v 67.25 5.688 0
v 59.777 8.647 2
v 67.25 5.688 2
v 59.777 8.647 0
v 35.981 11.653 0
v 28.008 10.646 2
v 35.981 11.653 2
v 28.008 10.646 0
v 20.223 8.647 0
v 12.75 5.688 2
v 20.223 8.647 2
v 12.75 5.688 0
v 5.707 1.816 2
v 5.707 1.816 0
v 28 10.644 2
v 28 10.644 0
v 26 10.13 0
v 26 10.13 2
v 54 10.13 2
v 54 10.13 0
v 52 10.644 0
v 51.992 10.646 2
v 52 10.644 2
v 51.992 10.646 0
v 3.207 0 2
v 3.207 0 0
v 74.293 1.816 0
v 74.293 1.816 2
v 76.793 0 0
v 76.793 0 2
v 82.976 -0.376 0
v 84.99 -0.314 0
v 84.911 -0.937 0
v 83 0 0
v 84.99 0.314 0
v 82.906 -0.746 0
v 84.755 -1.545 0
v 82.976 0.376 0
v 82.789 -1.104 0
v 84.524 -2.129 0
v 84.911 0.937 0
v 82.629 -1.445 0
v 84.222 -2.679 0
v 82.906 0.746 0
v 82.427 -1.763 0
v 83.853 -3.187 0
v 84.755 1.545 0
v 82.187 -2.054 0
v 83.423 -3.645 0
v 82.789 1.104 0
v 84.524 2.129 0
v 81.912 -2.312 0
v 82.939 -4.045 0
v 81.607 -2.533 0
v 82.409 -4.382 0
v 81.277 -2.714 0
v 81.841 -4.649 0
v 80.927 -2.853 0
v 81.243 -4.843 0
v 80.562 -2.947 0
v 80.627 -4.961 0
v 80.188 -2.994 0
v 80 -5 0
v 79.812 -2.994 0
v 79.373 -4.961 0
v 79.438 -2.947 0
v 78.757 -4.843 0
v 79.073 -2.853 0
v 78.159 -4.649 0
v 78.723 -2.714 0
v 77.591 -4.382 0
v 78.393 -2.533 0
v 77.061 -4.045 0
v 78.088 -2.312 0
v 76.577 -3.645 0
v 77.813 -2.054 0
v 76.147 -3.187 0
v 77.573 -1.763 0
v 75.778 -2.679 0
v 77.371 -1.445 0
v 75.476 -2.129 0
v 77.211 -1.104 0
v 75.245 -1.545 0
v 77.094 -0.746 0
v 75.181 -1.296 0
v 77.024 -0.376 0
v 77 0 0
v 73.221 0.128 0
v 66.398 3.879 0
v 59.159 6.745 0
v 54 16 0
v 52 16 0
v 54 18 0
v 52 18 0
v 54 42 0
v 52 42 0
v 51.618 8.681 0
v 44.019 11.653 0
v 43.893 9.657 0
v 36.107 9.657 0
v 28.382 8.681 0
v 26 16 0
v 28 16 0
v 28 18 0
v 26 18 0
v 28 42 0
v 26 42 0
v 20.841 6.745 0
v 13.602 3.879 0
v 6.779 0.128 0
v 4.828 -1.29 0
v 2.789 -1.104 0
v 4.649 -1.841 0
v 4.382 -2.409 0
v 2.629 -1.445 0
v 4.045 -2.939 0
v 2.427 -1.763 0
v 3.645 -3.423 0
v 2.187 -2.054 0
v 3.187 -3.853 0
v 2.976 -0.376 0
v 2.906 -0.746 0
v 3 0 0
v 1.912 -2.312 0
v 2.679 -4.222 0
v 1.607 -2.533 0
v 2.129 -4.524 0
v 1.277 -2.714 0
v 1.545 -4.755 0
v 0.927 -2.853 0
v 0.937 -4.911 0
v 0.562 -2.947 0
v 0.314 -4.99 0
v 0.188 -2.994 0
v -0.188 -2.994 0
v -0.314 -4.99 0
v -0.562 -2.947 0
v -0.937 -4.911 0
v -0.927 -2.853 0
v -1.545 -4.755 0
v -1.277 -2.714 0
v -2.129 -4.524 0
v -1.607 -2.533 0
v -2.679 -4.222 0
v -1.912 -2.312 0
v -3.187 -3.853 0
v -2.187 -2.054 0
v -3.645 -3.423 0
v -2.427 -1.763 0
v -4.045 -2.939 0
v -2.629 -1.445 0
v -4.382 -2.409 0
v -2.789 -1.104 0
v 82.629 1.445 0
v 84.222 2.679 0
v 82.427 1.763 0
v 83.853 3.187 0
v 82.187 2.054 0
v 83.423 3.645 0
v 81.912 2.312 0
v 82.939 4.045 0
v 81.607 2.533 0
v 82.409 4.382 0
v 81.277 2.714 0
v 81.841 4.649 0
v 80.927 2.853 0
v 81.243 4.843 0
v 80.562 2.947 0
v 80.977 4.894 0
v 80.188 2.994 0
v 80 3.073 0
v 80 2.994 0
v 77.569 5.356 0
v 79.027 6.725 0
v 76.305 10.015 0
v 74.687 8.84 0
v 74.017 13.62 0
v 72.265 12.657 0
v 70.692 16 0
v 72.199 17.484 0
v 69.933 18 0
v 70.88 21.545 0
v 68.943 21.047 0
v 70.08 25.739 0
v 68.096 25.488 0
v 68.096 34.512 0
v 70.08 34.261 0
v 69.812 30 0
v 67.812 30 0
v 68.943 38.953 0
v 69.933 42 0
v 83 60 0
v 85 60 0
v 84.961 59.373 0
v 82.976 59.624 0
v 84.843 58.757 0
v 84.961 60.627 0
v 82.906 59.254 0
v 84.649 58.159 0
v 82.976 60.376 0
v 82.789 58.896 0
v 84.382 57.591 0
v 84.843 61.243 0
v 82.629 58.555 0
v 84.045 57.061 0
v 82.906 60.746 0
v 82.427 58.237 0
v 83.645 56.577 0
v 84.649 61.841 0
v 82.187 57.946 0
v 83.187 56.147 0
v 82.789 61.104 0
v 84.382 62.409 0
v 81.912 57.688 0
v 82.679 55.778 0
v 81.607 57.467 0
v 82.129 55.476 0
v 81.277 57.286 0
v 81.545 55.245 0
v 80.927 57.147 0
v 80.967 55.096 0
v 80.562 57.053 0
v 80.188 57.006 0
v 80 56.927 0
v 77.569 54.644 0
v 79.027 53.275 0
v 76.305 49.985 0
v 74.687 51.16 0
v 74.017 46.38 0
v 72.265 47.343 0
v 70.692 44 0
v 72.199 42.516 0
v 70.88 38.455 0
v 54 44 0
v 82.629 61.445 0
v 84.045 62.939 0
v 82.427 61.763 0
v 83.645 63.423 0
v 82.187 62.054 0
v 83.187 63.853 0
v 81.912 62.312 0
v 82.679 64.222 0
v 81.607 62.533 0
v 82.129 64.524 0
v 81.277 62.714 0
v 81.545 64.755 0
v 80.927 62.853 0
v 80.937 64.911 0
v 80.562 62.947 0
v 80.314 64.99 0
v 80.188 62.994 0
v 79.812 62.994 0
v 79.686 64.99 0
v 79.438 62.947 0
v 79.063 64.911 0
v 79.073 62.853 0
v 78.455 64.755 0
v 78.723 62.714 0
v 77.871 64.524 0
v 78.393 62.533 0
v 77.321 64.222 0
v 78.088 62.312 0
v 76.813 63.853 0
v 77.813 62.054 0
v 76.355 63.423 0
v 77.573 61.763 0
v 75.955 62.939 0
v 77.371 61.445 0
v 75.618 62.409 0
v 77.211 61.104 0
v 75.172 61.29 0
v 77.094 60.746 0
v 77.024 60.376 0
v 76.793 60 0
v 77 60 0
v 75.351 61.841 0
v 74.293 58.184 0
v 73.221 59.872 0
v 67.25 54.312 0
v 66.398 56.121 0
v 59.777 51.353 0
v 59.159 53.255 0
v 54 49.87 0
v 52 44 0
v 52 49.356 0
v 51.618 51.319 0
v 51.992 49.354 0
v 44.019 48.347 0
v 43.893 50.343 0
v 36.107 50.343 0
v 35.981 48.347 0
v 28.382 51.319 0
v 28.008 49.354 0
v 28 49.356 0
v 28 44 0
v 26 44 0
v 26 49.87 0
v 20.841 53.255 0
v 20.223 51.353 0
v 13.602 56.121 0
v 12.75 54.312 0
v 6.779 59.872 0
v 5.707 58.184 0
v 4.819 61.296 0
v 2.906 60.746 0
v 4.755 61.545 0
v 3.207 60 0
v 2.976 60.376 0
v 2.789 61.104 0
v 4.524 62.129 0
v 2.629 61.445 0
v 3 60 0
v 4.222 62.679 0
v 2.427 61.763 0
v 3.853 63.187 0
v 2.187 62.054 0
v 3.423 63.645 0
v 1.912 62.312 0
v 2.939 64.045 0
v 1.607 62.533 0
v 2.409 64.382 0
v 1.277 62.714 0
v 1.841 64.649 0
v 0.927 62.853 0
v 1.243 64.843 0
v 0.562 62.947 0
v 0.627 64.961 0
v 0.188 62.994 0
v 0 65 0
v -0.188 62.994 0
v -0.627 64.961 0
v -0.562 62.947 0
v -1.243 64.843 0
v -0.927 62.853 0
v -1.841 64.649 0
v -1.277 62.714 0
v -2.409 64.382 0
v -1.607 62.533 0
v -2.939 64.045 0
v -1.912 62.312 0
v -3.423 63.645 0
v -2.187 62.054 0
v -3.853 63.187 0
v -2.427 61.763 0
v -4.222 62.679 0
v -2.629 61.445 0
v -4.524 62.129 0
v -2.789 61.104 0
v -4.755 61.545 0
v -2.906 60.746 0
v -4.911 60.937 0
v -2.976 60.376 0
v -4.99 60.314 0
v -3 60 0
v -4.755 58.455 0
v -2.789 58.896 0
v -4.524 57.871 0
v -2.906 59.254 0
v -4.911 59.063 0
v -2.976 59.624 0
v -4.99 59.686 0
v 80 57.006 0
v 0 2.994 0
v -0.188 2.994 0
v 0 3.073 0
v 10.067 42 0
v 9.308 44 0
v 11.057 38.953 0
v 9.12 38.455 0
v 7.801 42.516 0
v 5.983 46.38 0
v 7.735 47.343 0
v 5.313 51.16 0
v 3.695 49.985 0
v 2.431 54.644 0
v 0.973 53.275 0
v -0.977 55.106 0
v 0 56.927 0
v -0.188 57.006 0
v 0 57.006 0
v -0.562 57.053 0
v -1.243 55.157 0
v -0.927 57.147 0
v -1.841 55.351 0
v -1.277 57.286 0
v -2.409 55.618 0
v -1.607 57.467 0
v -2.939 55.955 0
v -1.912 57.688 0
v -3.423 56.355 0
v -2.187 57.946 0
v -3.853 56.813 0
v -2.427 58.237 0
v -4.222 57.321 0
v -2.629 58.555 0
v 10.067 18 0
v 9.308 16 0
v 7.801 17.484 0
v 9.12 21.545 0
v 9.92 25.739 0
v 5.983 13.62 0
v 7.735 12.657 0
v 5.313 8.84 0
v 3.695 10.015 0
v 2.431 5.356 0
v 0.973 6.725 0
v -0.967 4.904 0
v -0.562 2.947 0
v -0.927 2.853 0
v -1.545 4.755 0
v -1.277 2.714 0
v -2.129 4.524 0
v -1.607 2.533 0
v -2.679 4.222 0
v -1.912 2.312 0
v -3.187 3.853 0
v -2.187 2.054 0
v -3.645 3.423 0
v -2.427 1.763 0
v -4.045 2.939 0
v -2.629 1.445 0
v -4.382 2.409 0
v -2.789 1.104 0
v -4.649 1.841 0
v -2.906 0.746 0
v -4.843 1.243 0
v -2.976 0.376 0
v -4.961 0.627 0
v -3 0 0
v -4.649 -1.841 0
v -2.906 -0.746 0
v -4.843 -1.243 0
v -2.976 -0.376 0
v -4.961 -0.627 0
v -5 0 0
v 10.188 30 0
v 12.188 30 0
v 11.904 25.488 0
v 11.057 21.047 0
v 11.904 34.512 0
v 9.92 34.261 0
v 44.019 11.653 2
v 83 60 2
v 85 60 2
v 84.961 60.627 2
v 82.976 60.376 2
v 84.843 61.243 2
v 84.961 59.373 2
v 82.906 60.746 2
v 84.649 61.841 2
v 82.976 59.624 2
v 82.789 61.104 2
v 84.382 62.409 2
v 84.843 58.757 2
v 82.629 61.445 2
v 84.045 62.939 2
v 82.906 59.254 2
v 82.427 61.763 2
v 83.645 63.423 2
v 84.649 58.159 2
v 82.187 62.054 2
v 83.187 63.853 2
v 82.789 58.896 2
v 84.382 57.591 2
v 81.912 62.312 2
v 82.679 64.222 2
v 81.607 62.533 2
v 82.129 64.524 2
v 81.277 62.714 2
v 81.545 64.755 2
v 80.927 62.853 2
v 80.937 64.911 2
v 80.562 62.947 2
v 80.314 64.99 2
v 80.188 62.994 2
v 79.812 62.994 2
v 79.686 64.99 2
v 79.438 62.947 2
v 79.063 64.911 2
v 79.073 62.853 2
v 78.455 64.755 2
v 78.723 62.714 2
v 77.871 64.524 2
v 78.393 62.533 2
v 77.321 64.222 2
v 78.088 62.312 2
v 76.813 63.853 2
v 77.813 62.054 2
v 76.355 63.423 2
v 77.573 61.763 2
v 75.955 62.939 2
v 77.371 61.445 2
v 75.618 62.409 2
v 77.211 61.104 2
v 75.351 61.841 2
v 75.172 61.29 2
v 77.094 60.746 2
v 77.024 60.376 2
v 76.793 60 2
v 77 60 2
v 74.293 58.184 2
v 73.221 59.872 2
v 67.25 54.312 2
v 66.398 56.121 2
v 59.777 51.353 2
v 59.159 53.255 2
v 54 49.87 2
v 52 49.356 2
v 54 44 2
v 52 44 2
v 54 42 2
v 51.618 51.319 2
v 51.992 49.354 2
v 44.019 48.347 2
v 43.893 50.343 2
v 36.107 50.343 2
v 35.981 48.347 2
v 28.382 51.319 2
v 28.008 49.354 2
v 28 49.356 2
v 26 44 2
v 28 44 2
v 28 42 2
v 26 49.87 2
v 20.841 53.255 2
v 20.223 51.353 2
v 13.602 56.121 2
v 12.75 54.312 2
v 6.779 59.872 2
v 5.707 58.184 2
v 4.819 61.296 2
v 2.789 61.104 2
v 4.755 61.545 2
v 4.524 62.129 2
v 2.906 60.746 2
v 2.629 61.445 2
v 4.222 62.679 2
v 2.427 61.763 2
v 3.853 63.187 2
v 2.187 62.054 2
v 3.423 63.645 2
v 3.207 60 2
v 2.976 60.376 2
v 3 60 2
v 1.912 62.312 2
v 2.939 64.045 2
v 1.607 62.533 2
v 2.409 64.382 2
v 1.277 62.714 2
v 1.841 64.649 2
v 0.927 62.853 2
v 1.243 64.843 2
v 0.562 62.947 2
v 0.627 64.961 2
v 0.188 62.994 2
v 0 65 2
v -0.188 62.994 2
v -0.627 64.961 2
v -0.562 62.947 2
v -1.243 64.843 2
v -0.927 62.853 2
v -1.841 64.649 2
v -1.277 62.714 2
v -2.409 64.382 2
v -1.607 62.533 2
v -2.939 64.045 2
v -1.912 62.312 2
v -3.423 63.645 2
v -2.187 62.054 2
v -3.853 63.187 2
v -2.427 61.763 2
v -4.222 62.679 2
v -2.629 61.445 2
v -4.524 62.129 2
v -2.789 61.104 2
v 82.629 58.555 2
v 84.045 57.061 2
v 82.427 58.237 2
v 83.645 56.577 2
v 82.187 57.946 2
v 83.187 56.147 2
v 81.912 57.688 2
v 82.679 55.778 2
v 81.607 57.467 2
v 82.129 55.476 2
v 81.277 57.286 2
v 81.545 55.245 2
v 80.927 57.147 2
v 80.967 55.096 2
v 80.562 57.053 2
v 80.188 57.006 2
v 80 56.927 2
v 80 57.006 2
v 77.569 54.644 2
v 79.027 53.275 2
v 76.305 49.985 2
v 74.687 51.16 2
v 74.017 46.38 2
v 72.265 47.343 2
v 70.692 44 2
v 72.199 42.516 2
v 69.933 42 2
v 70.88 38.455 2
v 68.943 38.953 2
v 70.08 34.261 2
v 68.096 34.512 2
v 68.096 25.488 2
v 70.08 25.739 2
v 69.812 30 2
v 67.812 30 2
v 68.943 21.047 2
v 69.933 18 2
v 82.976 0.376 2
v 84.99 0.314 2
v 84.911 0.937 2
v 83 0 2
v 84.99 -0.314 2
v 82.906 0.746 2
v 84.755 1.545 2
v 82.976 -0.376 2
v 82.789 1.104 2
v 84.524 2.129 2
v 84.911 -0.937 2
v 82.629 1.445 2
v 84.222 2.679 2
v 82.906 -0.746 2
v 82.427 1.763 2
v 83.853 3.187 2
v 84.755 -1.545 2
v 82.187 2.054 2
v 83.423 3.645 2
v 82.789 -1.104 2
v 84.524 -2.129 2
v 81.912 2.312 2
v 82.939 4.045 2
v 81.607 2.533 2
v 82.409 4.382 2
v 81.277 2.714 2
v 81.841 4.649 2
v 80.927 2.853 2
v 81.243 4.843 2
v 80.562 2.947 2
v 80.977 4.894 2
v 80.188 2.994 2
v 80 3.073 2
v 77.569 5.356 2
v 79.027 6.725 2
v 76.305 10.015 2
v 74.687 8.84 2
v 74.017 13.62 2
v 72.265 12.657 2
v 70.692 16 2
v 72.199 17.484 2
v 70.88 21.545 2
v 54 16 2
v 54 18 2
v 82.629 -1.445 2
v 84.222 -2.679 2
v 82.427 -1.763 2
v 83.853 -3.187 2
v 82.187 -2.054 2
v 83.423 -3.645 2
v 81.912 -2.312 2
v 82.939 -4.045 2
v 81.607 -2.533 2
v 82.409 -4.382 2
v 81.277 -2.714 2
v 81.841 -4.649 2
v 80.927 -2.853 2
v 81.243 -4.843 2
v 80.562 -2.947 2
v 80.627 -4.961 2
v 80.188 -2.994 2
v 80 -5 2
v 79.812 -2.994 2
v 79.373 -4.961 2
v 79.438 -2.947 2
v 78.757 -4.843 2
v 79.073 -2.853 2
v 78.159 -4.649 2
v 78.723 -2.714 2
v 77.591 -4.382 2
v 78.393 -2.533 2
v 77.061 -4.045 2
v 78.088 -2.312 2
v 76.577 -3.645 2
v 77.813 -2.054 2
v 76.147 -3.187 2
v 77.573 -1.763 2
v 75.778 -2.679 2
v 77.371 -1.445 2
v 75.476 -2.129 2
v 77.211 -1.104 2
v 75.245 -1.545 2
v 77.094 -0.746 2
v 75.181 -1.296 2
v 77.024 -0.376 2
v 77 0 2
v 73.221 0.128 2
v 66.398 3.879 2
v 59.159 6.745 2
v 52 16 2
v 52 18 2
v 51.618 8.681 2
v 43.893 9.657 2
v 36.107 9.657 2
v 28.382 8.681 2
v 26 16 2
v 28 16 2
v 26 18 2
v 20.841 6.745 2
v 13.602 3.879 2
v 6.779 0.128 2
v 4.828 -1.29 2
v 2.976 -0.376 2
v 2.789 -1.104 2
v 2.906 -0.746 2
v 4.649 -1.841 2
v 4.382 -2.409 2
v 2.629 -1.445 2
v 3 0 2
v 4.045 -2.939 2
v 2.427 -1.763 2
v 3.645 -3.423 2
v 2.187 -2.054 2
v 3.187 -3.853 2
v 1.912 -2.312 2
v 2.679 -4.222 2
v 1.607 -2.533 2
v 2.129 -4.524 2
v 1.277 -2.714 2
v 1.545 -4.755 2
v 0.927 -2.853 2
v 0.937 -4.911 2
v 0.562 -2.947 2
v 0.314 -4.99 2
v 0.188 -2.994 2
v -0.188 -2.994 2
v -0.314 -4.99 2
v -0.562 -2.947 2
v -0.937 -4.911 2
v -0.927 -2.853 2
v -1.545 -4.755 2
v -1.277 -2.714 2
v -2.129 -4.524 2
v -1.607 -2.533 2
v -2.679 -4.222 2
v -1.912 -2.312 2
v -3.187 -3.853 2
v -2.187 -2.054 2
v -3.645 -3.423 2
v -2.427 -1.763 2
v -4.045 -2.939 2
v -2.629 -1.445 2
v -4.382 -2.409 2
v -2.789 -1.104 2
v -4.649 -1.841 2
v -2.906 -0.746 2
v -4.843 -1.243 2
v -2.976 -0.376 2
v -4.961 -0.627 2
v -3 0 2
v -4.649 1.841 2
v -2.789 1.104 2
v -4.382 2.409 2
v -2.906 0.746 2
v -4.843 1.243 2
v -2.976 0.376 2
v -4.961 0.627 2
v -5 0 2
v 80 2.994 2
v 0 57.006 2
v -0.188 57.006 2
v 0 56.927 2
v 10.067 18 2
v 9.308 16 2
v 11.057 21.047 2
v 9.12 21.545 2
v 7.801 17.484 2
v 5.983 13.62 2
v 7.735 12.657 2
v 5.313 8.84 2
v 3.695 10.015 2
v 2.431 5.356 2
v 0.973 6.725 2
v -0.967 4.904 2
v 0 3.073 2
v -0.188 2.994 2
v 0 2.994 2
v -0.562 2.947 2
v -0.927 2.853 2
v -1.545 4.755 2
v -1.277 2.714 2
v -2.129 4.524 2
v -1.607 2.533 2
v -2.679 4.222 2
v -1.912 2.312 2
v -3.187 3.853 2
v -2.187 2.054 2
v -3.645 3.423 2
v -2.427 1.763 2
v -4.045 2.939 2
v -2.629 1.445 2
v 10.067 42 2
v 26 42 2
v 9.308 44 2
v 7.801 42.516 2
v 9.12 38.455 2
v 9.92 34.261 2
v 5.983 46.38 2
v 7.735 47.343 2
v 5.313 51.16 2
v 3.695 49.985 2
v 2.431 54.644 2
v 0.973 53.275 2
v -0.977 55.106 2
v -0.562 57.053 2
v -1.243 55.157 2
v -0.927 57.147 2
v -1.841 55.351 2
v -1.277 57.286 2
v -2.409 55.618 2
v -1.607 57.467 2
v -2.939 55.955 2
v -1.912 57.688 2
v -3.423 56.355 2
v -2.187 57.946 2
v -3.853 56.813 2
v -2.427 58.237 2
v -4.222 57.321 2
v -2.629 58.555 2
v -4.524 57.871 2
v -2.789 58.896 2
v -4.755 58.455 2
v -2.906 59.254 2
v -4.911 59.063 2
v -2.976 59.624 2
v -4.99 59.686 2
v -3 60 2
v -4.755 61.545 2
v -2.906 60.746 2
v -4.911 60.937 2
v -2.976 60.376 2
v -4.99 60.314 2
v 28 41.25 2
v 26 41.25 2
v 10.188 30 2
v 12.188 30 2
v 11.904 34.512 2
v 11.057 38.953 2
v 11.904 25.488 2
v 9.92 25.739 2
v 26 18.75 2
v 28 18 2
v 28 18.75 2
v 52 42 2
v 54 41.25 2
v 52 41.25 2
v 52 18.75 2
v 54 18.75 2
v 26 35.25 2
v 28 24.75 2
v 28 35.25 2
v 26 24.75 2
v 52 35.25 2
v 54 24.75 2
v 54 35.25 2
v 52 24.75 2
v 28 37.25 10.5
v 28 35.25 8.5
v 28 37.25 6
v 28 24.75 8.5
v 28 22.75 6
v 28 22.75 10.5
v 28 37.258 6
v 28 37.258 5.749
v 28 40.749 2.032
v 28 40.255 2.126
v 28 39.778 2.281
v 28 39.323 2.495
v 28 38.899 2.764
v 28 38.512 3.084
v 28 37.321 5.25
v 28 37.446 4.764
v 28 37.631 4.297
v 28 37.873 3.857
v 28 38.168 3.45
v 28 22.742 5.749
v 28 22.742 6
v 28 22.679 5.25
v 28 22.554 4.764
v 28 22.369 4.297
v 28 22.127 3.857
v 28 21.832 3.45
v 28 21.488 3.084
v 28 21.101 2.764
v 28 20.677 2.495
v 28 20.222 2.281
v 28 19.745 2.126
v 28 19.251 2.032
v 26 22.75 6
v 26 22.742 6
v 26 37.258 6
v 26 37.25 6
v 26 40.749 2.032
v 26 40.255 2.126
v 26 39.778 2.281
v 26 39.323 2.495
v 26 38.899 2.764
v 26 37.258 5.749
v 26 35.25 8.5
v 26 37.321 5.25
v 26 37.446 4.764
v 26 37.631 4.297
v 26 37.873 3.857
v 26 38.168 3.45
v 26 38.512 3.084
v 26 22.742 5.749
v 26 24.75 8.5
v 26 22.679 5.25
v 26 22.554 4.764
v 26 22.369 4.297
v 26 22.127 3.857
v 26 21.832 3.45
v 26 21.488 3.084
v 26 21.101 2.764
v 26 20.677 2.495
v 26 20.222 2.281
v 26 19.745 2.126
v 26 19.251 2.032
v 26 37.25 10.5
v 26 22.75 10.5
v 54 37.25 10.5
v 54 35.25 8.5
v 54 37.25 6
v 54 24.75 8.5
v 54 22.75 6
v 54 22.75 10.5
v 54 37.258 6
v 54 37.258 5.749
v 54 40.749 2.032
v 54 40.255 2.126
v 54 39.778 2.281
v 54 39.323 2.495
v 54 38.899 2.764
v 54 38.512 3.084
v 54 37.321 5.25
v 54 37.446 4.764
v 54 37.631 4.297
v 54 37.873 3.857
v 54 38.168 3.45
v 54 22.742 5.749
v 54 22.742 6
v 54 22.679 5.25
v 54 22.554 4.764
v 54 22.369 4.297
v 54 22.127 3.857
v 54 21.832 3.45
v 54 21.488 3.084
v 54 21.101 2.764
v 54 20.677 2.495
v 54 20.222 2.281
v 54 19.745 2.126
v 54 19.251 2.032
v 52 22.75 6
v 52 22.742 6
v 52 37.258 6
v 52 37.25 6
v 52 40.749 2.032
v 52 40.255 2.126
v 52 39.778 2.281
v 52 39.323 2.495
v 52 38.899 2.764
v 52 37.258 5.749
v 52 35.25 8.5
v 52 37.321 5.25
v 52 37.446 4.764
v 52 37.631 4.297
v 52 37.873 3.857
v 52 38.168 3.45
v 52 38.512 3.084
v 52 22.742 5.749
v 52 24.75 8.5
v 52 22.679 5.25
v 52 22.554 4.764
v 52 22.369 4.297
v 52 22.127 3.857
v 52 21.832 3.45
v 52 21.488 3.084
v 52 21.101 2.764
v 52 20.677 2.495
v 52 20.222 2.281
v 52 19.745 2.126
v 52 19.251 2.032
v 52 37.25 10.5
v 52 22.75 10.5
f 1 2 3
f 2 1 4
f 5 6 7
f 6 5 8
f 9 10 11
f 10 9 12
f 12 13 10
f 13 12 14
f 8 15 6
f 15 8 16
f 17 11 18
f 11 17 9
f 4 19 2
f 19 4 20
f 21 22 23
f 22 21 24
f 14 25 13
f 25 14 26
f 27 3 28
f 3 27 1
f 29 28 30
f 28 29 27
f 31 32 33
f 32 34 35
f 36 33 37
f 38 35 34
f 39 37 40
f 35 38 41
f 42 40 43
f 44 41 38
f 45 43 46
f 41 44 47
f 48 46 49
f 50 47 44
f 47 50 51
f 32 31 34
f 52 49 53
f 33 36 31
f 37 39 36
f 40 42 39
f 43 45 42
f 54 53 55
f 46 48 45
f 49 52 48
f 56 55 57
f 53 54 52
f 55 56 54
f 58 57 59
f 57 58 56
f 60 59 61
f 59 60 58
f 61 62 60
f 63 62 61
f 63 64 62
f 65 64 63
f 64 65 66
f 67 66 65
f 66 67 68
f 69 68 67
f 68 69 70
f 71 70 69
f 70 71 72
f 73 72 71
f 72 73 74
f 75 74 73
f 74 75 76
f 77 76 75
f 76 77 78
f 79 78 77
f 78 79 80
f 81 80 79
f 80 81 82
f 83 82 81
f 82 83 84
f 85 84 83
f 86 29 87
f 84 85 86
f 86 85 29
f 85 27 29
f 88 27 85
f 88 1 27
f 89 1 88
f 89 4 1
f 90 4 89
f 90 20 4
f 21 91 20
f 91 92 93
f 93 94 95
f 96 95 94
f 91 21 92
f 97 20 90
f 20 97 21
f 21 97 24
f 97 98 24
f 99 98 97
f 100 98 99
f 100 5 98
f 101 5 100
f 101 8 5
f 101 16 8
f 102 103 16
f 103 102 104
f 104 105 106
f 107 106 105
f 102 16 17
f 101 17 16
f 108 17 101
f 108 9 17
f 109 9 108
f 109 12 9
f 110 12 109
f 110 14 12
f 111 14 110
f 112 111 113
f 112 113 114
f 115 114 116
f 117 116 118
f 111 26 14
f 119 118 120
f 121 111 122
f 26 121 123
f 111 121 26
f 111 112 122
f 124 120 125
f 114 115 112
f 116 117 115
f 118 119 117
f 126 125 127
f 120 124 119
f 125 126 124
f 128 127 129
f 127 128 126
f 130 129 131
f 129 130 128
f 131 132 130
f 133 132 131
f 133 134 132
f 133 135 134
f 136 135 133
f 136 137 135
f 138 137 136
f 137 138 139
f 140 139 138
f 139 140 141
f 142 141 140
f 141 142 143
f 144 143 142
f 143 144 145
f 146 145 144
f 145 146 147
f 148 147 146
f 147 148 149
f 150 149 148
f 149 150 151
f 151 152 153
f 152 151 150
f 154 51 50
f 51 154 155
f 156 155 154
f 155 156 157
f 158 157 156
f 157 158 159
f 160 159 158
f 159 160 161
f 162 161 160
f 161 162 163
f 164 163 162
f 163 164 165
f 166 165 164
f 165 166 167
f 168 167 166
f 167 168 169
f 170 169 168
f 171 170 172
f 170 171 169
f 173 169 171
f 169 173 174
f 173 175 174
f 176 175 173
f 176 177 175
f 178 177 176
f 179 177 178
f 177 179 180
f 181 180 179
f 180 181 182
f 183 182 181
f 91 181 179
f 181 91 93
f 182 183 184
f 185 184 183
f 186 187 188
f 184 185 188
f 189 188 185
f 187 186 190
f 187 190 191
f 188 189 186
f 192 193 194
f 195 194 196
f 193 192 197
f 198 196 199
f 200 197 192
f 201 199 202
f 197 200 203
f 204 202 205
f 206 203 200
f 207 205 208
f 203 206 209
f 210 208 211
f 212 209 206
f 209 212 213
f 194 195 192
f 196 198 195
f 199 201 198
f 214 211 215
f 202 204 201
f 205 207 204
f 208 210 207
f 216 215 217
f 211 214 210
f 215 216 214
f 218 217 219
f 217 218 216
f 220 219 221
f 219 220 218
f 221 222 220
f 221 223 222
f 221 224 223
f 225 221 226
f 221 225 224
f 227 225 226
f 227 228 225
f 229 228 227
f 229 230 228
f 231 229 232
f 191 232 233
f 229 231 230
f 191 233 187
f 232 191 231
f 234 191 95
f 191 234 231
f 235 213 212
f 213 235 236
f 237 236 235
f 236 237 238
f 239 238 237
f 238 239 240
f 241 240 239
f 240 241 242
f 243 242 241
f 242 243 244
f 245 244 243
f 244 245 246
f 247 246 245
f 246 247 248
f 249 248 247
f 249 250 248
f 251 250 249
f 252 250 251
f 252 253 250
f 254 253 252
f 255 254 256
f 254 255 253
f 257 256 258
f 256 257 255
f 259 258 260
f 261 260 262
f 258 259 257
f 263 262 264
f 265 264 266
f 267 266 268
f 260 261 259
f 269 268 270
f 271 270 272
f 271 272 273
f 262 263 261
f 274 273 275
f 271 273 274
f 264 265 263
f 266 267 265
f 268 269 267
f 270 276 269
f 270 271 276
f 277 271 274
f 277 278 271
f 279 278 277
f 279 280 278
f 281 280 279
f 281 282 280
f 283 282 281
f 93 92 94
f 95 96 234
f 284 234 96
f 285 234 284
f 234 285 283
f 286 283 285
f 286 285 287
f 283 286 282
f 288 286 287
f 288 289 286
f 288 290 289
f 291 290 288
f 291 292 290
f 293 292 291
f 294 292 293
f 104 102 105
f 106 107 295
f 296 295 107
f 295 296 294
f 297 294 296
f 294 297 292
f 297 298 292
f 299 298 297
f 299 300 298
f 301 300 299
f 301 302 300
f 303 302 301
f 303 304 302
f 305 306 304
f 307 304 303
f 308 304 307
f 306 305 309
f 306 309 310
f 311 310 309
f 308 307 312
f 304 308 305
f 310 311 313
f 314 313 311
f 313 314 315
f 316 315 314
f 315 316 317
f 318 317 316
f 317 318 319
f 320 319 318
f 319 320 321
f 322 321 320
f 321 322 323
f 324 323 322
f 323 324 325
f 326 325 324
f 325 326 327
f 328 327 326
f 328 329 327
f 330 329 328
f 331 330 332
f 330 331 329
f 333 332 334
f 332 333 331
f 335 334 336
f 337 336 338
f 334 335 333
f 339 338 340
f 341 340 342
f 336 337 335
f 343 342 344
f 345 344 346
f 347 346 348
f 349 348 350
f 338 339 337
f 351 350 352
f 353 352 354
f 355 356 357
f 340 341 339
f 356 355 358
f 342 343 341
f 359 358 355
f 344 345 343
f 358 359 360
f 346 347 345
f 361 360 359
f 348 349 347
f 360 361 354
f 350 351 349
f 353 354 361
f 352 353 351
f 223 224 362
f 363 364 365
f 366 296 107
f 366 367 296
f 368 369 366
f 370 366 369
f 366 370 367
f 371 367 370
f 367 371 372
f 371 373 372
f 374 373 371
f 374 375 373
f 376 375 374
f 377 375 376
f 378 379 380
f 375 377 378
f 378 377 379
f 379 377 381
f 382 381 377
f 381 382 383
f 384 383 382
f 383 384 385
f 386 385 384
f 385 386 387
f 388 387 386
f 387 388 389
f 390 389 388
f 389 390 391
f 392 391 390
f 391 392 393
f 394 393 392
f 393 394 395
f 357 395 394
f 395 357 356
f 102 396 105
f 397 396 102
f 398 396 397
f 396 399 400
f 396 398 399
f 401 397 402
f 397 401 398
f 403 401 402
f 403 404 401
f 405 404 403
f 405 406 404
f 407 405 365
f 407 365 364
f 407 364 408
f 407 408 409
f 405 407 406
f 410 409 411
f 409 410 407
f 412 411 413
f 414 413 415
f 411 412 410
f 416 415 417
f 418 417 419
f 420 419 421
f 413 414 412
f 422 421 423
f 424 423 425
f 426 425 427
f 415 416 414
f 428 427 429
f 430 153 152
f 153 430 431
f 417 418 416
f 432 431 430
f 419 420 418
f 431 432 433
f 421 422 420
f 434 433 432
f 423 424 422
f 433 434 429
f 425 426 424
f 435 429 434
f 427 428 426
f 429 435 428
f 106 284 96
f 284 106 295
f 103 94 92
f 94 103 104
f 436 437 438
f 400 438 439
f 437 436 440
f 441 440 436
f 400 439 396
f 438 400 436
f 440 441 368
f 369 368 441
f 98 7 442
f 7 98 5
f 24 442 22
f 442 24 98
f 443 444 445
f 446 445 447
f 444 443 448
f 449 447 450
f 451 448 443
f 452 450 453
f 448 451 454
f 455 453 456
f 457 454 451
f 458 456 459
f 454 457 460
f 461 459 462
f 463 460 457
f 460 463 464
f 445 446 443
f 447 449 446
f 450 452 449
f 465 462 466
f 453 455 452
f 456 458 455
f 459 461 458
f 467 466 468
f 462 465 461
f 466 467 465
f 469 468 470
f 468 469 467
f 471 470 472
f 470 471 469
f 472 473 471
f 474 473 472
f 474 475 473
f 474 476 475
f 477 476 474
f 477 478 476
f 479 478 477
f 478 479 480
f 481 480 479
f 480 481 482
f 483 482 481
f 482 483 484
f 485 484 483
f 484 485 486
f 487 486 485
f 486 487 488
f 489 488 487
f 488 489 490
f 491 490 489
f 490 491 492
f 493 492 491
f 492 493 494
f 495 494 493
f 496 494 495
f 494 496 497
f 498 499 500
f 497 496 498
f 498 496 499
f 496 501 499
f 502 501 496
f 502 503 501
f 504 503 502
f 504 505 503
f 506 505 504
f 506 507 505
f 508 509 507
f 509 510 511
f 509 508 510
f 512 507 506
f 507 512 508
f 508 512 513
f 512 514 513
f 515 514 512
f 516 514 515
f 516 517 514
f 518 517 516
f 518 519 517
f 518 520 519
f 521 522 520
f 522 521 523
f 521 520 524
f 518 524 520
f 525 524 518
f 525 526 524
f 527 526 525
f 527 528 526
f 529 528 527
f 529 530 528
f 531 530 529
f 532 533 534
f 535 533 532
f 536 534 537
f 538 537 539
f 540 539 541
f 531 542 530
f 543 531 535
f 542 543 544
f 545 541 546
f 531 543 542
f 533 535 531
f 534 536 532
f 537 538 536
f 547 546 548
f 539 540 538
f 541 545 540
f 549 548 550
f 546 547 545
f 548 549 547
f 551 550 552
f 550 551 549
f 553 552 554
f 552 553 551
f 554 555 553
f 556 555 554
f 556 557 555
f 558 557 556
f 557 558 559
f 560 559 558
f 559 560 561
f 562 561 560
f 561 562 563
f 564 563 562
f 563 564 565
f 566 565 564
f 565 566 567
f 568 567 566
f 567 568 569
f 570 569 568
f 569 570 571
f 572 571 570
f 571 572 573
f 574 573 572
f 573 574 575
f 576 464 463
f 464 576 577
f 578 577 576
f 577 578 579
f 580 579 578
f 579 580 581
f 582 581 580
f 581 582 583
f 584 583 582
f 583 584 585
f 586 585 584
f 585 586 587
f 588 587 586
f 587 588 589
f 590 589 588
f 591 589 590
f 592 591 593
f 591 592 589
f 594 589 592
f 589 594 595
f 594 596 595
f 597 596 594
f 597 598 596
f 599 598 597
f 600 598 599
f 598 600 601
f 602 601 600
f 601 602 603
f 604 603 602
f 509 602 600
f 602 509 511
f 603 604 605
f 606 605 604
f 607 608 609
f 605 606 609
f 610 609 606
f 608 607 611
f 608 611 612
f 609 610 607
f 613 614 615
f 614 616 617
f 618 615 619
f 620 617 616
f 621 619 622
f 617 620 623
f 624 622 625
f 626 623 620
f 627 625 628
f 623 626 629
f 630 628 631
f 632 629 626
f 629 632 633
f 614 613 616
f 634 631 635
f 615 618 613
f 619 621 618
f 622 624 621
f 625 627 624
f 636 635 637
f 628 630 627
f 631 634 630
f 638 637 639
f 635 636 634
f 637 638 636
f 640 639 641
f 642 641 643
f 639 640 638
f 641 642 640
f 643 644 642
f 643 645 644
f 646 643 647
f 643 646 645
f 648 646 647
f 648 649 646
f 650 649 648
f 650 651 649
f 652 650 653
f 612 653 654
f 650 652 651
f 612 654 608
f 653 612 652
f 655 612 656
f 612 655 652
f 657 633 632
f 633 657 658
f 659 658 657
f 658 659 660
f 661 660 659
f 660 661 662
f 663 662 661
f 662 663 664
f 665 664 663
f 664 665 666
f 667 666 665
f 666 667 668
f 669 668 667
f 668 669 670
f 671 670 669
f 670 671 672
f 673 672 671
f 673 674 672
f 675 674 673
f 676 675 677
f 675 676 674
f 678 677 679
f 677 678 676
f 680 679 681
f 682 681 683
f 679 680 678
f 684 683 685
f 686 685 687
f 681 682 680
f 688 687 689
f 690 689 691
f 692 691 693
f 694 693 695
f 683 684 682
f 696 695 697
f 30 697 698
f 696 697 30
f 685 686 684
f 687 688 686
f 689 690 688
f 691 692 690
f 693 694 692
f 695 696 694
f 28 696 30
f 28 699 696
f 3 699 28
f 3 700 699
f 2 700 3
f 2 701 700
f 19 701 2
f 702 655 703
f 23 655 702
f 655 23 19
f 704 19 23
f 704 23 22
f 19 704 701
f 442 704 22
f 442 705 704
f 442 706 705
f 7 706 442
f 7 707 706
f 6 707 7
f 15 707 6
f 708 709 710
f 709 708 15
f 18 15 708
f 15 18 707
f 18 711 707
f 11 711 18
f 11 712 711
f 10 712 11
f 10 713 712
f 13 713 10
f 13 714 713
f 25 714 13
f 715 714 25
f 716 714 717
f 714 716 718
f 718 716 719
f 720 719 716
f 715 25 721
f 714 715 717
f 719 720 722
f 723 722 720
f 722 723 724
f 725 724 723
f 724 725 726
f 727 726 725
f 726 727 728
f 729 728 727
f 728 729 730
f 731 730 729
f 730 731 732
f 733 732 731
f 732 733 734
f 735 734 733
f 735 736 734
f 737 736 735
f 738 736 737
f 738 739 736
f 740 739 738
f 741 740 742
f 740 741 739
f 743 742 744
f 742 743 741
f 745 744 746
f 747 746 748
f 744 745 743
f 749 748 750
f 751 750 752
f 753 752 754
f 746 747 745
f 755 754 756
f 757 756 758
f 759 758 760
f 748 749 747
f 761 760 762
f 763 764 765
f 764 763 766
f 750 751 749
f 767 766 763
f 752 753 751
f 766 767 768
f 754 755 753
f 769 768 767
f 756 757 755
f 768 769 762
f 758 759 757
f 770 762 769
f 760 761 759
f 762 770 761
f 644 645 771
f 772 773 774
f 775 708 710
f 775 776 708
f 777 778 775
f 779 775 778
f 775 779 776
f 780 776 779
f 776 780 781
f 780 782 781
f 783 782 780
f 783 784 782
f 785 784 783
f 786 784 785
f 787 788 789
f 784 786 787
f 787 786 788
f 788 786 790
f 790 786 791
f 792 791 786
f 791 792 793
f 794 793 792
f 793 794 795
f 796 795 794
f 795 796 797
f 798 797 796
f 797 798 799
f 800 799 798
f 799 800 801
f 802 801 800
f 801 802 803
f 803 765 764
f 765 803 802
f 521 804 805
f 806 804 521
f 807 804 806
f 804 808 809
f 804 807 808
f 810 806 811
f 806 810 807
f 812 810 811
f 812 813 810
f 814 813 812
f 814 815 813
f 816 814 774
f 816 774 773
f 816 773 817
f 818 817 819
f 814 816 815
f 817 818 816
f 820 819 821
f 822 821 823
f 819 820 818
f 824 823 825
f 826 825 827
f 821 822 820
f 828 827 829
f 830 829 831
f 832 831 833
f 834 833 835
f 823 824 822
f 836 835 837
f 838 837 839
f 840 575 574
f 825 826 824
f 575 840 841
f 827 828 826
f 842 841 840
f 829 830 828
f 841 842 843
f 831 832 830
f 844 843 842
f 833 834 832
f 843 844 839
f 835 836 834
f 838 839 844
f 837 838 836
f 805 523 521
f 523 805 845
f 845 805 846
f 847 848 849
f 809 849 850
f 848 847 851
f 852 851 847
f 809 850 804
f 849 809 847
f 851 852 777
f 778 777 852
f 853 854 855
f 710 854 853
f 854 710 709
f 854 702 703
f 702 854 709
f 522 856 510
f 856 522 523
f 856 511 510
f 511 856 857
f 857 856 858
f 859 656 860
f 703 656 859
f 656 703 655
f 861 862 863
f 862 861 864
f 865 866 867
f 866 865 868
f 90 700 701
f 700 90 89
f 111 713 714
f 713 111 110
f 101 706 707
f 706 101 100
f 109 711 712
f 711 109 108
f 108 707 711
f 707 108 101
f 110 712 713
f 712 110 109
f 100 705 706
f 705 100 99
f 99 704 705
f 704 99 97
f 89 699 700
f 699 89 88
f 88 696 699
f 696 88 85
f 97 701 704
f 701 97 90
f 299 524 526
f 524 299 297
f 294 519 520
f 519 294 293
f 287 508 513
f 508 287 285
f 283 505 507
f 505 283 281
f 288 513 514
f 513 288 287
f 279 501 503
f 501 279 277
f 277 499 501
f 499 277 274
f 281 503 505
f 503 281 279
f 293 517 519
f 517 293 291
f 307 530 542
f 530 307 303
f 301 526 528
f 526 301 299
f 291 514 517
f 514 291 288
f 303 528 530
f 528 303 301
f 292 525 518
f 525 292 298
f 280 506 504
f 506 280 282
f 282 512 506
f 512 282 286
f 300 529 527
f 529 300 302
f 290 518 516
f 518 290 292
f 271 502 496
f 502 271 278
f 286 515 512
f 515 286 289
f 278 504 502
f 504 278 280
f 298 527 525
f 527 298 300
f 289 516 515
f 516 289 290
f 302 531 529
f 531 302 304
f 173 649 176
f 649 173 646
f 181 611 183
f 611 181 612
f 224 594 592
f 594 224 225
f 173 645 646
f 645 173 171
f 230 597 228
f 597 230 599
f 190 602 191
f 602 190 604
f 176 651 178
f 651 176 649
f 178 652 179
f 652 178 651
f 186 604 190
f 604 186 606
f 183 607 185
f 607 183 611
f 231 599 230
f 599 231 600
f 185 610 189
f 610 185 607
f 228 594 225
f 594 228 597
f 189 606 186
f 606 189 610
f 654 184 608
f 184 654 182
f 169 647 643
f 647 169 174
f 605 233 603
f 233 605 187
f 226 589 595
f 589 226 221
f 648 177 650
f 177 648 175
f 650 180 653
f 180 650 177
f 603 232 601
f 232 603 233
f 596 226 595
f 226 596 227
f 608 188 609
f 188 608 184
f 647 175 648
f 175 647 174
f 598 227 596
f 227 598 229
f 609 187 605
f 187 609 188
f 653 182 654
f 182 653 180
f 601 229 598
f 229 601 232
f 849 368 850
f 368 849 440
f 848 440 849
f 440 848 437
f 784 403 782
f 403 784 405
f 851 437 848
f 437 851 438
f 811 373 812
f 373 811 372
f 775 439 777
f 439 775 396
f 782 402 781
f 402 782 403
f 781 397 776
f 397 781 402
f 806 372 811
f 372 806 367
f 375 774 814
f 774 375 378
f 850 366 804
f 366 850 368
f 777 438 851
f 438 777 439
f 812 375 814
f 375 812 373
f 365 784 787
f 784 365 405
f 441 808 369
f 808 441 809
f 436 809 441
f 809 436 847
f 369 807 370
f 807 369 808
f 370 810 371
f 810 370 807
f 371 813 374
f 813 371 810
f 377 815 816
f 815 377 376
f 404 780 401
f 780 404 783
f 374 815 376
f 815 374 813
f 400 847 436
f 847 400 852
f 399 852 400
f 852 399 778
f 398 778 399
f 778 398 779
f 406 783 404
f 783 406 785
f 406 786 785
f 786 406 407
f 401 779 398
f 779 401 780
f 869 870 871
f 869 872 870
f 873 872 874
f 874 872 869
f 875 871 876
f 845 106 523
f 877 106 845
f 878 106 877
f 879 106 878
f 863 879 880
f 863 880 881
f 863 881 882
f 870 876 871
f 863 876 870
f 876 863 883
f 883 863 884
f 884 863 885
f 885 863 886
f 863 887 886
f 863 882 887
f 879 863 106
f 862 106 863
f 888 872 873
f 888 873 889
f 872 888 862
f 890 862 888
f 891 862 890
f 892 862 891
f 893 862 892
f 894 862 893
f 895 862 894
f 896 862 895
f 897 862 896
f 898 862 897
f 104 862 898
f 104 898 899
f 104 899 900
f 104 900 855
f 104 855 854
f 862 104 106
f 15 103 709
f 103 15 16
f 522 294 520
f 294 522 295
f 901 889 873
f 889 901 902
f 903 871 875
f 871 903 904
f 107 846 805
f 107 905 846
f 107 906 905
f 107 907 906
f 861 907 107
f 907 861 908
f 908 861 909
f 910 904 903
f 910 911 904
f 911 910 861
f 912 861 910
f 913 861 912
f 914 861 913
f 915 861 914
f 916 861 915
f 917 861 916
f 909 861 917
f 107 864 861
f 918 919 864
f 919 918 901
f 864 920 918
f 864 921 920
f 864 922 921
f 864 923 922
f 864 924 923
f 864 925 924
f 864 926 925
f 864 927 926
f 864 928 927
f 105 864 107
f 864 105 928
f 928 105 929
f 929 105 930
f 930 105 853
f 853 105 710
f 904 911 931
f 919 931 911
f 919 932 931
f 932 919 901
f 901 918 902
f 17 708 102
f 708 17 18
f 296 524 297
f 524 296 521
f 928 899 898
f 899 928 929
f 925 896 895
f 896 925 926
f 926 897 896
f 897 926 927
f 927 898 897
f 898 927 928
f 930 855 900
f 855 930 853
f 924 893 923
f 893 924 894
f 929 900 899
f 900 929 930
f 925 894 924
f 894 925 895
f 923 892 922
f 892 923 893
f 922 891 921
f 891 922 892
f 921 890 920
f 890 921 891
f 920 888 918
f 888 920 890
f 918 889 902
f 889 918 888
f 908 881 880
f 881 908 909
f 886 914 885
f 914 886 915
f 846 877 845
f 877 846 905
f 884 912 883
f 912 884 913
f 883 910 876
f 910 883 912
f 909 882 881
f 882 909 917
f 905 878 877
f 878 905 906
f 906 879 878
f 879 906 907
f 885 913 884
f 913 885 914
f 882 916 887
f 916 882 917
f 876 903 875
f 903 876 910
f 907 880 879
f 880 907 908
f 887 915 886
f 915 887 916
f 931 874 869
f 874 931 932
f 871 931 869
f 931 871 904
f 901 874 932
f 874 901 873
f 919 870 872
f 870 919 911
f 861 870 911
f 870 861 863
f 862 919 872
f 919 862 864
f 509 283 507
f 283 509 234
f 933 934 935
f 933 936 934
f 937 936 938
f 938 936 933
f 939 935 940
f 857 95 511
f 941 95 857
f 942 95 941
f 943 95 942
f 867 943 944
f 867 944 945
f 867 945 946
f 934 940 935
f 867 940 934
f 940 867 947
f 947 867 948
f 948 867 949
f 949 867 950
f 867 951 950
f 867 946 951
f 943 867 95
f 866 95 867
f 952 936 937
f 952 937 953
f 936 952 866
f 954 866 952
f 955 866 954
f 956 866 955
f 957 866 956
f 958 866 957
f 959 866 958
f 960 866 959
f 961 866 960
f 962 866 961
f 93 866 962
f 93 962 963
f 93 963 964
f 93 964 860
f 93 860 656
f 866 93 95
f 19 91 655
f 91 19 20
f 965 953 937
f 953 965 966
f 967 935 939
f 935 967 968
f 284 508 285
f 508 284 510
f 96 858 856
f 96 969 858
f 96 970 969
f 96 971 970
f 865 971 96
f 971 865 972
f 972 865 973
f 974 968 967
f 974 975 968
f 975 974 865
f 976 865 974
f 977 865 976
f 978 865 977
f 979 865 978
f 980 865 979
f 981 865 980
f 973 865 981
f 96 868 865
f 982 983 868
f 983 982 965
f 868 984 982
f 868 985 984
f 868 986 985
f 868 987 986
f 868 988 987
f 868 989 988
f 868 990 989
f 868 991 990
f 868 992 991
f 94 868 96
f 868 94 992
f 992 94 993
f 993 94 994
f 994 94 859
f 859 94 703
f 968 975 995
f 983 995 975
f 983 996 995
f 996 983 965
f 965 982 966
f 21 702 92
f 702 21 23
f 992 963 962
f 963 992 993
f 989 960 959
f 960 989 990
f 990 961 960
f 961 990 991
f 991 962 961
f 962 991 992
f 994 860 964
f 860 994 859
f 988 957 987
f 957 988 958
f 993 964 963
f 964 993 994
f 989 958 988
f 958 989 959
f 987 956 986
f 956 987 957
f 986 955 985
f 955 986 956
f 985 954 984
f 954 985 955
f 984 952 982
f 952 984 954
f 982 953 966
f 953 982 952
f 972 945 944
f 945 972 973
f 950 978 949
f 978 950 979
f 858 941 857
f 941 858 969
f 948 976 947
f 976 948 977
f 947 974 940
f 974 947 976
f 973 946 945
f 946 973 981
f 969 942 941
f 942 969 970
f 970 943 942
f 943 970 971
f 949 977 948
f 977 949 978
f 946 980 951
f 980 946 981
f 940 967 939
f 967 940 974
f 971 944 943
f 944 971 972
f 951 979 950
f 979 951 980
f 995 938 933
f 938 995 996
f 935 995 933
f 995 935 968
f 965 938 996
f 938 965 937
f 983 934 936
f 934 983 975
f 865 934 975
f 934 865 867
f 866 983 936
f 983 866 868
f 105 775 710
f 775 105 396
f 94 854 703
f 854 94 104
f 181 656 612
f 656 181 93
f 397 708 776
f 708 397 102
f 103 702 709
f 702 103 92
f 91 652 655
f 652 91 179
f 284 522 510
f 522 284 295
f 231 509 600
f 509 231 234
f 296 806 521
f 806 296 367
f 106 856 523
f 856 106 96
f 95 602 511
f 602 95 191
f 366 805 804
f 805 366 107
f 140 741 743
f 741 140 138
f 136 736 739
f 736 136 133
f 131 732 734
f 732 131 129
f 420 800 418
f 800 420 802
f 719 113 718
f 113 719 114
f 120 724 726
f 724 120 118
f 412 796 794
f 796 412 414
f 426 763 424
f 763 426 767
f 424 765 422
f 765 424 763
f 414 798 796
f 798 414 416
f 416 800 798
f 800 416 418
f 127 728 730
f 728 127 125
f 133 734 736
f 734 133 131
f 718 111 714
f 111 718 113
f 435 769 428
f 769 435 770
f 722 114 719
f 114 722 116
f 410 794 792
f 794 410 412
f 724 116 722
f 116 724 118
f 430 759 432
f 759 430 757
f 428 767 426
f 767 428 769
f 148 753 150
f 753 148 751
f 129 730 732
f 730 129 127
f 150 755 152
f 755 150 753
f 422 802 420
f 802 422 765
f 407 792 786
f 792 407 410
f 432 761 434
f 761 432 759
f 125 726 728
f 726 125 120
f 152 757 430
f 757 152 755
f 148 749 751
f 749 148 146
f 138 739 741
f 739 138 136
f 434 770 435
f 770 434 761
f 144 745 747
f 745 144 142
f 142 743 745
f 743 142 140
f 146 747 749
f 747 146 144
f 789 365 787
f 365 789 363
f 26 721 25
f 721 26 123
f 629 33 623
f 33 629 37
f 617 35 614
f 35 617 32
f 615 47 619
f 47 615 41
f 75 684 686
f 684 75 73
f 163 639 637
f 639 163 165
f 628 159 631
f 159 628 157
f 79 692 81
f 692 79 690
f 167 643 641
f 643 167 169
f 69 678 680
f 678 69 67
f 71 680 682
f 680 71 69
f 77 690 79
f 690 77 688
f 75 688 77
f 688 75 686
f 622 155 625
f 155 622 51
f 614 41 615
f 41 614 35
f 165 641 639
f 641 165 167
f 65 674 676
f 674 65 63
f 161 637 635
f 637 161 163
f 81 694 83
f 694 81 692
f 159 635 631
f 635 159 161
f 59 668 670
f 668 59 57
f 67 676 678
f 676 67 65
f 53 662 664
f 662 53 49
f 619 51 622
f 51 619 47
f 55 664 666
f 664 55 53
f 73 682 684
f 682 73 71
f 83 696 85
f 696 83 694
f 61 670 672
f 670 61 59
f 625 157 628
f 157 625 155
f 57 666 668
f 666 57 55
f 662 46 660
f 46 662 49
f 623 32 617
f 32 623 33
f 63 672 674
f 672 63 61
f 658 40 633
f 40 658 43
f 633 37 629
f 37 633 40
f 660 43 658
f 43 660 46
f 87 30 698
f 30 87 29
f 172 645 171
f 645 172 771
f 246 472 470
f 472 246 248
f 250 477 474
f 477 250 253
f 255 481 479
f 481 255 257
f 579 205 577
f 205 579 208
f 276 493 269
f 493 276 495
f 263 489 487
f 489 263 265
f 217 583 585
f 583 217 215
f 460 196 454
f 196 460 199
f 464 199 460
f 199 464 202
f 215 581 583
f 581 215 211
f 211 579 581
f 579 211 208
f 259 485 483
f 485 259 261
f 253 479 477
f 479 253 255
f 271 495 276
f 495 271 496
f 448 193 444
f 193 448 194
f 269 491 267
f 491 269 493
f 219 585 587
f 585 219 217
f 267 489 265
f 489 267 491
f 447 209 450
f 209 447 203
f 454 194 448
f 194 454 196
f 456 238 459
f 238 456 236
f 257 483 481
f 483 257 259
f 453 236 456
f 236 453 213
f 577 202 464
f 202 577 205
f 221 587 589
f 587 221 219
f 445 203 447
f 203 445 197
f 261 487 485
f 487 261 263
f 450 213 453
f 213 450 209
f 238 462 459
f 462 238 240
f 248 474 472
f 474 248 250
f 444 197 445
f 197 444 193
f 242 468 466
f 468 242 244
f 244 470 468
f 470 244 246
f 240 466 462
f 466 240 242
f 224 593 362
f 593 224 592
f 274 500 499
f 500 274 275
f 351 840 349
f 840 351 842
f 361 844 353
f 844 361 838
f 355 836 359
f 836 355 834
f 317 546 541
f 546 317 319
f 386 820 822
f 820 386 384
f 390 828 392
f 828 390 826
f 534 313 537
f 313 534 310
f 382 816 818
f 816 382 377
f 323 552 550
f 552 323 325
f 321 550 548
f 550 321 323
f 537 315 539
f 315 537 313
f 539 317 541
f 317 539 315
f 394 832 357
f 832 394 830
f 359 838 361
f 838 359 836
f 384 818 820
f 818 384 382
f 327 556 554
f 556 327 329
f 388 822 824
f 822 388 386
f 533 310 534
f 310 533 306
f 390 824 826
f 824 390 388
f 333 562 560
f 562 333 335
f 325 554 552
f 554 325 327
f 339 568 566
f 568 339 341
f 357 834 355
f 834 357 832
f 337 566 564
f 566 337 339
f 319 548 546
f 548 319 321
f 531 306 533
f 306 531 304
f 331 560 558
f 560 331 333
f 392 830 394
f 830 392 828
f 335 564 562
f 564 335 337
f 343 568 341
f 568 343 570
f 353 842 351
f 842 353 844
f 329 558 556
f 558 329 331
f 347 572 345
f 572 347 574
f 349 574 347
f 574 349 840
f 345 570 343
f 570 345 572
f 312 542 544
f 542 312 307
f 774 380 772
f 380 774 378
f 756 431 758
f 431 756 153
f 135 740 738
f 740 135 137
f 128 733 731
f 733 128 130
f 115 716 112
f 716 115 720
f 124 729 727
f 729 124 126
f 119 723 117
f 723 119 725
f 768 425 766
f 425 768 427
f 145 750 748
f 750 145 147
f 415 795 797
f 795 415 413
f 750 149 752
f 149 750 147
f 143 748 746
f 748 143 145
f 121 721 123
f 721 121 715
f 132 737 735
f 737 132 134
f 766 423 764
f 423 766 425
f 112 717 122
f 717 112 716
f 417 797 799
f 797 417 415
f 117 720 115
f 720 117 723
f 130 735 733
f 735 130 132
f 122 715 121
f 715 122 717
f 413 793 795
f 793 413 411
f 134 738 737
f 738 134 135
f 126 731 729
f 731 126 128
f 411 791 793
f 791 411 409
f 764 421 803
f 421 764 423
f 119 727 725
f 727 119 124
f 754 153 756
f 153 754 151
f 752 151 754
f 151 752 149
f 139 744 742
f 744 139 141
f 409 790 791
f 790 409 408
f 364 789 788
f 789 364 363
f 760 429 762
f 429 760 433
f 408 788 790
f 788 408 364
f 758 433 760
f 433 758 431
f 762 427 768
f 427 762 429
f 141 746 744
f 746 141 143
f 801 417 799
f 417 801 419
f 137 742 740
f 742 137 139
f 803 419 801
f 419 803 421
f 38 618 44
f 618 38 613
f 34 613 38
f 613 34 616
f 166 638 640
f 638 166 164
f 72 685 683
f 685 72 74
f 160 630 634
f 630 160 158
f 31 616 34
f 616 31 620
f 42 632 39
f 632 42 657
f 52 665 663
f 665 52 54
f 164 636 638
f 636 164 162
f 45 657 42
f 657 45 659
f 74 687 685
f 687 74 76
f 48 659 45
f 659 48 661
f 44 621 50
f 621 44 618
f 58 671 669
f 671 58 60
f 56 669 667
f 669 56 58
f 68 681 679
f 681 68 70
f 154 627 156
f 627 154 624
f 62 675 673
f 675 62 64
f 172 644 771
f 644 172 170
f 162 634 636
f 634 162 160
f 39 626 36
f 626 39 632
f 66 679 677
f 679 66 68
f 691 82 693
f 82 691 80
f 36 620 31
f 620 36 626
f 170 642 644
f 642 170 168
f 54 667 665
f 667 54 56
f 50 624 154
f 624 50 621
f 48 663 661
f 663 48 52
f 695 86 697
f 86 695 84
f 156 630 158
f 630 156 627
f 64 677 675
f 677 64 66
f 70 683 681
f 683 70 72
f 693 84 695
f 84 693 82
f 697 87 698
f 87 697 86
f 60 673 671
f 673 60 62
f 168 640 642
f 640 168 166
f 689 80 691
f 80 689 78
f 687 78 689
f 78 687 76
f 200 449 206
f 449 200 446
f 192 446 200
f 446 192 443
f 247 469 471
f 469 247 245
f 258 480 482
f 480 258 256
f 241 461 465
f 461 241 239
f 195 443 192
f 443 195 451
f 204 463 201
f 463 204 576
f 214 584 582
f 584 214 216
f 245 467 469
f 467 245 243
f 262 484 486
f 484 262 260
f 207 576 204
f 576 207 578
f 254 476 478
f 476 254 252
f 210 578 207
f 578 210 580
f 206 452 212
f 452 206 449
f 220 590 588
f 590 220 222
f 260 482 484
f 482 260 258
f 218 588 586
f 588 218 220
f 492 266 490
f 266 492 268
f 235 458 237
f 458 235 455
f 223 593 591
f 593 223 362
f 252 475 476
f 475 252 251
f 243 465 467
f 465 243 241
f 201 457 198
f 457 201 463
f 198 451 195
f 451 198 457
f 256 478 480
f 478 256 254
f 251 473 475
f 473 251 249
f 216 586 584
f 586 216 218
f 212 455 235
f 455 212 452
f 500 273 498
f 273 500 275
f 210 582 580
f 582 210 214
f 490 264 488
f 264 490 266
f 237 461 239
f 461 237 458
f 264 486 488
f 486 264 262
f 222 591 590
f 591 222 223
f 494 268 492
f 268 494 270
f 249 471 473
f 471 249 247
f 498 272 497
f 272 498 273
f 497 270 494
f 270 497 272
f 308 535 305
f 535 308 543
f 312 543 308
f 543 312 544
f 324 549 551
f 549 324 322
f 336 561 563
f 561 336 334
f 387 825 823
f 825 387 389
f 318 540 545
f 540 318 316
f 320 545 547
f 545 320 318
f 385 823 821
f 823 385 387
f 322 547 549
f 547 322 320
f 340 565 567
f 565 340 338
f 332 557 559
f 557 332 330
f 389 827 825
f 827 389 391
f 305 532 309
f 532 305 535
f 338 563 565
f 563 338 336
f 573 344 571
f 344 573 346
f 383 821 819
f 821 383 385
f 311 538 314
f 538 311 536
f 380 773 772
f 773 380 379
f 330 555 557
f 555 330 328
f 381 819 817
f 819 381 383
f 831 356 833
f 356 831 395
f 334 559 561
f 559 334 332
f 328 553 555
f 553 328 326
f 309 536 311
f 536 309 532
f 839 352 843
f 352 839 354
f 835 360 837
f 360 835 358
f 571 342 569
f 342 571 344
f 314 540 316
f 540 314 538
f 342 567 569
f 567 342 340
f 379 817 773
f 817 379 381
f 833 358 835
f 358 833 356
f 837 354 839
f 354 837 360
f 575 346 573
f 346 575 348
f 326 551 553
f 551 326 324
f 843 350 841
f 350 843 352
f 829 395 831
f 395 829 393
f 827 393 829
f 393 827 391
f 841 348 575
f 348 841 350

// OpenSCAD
// ************************
// * Adjustable variables *
// ************************
motor_diameter = 6;
body_l = 80;
body_w = 60;
body_h = 2;
wall_thickness = 2;

center_hole_length = 24;
center_hole_width = 24;
battery_width = 10.5;
battery_height = 6.5;
battery_holder_slope_length = wall_thickness * 2;

// Curve radius for the sides. Smaller radius = deeper sidecut.
// These values must fit the following requirements:
//    body_length_curve_radius >= (body_l - motor_diameter)/2
//    body_width_curve_radius >= (body_w - motor_diameter)/2
body_length_curve_radius = body_l * 0.8;
body_width_curve_radius = body_w * 0.6;

// Whether or not you want a full circle around your motors
closed_motor_holder = false;

// ************************
// * Calculated variables *
// ************************
length_arc_length = body_l - motor_diameter;
width_arc_length = body_w - motor_diameter;

length_angle = asin((length_arc_length/2)/body_length_curve_radius);
length_circle_center_translation = cos(length_angle) * body_length_curve_radius;
length_sidecut_depth = body_length_curve_radius - length_circle_center_translation;

width_angle = asin((width_arc_length/2)/body_width_curve_radius);
width_circle_center_translation = cos(width_angle) * body_width_curve_radius;
width_sidecut_depth = body_width_curve_radius - width_circle_center_translation;

$fn = 50;

// build the frame body without motor holders
module frame_body() {
    union(){
        frame_side(circle_translation=[body_l/2, -length_circle_center_translation, 0], circle_radius=body_length_curve_radius);
        frame_side(circle_translation=[body_l/2, body_w + length_circle_center_translation, 0], circle_radius=body_length_curve_radius);
        frame_side(circle_translation=[body_l + width_circle_center_translation, body_w/2, 0], circle_radius=body_width_curve_radius);
        frame_side(circle_translation=[-width_circle_center_translation, body_w/2, 0], circle_radius=body_width_curve_radius);
        inner_frame();
    }
}

// build an internal lattice to support the flight controller and battery
module inner_frame() {
    width_contact_point_angle = asin((center_hole_width/2 + wall_thickness/2)/body_width_curve_radius);
    width_contact_point_translation = cos(width_contact_point_angle) * body_width_curve_radius;

    length_contact_point_angle = asin((center_hole_length/2 + wall_thickness/2)/body_length_curve_radius);
    length_contact_point_translation = cos(length_contact_point_angle) * body_length_curve_radius;

    inner_frame_length = body_l - (width_contact_point_translation - width_circle_center_translation) * 2 + wall_thickness;
    inner_frame_width = body_w - (length_contact_point_translation - length_circle_center_translation) * 2 +  wall_thickness;

    union() {
        // Width cross-frame
        translate([body_l/2 - center_hole_length/2 - wall_thickness, length_contact_point_translation - length_circle_center_translation - wall_thickness/2, 0])
            cube([wall_thickness, inner_frame_width, body_h]);
        translate([body_l/2 + center_hole_length/2, length_contact_point_translation - length_circle_center_translation - wall_thickness/2, 0])
            cube([wall_thickness, inner_frame_width, body_h]);

        // Length cross-frame
        translate([width_contact_point_translation - width_circle_center_translation - wall_thickness/2, body_w/2 - center_hole_width/2 - wall_thickness, 0])
            cube([inner_frame_length, wall_thickness, body_h]);
        translate([width_contact_point_translation - width_circle_center_translation - wall_thickness/2, body_w/2 + center_hole_width/2, 0])
            cube([inner_frame_length, wall_thickness, body_h]);

        battery_holder();
    }
}

// build both brackets for the battery
module battery_holder() {
    translate([body_l/2 - center_hole_length/2 - wall_thickness, body_w/2 - (battery_width + wall_thickness * 2)/2, body_h])
        battery_holder_bracket();
    translate([body_l/2 + center_hole_length/2, body_w/2 - (battery_width + wall_thickness * 2)/2, body_h])
        battery_holder_bracket();
}

// build a single bracket for the battery
module battery_holder_bracket() {
    difference() {
        union() {
            cube([wall_thickness, battery_width + wall_thickness * 2, battery_height + wall_thickness]);
            difference() {
                difference() {
                    translate([0, -battery_holder_slope_length, 0])
                        cube([wall_thickness, battery_width + wall_thickness * 2 + battery_holder_slope_length * 2, battery_holder_slope_length]);
                    translate([0, -battery_holder_slope_length, battery_holder_slope_length])
                        rotate([0, 90, 0])
                            cylinder(h = wall_thickness + 2, r = battery_holder_slope_length);
                }
                translate([0, battery_width + wall_thickness * 2 + battery_holder_slope_length, battery_holder_slope_length])
                    rotate([0, 90, 0])
                        cylinder(h = wall_thickness + 2, r = battery_holder_slope_length);
            }
        }
        translate([-1, wall_thickness, 0])
            cube([wall_thickness + 2, battery_width, battery_height]);
    }
}

// build a single arching frame side
module frame_side(circle_translation, circle_radius) {
    intersection() {
            // base rectangle for the frame
            translate([-motor_diameter/2, -motor_diameter/2, 0])
                cube([body_l + motor_diameter, body_w + motor_diameter, body_h]);
            // circle to create arching side
            translate(circle_translation)
                difference() {
                    translate([0,0,0])
                        cylinder(h=body_h, r=circle_radius);
                    translate([0,0,-1])
                        cylinder(h=body_h + 2, r=circle_radius-wall_thickness);
                }
        }
}

// build a single motor holder
module motor_holder() {
    difference() {
        cylinder(h=body_h, r=motor_diameter/2 + wall_thickness);
        if (!closed_motor_holder) {
            translate([0, 0, -1])
                cube([motor_diameter, motor_diameter, body_h + 2]);
        }
    }
}

module motor_holders() {
    motor_holder();
    translate([body_l, 0, 0])
        rotate([0, 0, 90])
            motor_holder();
    translate([body_l, body_w, 0])
        rotate([0, 0, 180])
            motor_holder();
    translate([0, body_w, 0])
        rotate([0, 0, 270])
        motor_holder();
}

// build all motor holes
// this is used for final "drilling" of the motor holes
module motor_holes() {
    translate([0, 0, -1])
        cylinder(h=body_h + 2, r=motor_diameter/2);
    translate([body_l, 0, -1])
        cylinder(h=body_h + 2, r=motor_diameter/2);
    translate([body_l, body_w, -1])
        cylinder(h=body_h + 2, r=motor_diameter/2);
    translate([0, body_w, -1])
        cylinder(h=body_h + 2, r=motor_diameter/2);
}

// put all the components together
module build_frame() {
    difference() {
        union() {
            frame_body();   
            motor_holders();
        }
        motor_holes();
    }
}

build_frame();
